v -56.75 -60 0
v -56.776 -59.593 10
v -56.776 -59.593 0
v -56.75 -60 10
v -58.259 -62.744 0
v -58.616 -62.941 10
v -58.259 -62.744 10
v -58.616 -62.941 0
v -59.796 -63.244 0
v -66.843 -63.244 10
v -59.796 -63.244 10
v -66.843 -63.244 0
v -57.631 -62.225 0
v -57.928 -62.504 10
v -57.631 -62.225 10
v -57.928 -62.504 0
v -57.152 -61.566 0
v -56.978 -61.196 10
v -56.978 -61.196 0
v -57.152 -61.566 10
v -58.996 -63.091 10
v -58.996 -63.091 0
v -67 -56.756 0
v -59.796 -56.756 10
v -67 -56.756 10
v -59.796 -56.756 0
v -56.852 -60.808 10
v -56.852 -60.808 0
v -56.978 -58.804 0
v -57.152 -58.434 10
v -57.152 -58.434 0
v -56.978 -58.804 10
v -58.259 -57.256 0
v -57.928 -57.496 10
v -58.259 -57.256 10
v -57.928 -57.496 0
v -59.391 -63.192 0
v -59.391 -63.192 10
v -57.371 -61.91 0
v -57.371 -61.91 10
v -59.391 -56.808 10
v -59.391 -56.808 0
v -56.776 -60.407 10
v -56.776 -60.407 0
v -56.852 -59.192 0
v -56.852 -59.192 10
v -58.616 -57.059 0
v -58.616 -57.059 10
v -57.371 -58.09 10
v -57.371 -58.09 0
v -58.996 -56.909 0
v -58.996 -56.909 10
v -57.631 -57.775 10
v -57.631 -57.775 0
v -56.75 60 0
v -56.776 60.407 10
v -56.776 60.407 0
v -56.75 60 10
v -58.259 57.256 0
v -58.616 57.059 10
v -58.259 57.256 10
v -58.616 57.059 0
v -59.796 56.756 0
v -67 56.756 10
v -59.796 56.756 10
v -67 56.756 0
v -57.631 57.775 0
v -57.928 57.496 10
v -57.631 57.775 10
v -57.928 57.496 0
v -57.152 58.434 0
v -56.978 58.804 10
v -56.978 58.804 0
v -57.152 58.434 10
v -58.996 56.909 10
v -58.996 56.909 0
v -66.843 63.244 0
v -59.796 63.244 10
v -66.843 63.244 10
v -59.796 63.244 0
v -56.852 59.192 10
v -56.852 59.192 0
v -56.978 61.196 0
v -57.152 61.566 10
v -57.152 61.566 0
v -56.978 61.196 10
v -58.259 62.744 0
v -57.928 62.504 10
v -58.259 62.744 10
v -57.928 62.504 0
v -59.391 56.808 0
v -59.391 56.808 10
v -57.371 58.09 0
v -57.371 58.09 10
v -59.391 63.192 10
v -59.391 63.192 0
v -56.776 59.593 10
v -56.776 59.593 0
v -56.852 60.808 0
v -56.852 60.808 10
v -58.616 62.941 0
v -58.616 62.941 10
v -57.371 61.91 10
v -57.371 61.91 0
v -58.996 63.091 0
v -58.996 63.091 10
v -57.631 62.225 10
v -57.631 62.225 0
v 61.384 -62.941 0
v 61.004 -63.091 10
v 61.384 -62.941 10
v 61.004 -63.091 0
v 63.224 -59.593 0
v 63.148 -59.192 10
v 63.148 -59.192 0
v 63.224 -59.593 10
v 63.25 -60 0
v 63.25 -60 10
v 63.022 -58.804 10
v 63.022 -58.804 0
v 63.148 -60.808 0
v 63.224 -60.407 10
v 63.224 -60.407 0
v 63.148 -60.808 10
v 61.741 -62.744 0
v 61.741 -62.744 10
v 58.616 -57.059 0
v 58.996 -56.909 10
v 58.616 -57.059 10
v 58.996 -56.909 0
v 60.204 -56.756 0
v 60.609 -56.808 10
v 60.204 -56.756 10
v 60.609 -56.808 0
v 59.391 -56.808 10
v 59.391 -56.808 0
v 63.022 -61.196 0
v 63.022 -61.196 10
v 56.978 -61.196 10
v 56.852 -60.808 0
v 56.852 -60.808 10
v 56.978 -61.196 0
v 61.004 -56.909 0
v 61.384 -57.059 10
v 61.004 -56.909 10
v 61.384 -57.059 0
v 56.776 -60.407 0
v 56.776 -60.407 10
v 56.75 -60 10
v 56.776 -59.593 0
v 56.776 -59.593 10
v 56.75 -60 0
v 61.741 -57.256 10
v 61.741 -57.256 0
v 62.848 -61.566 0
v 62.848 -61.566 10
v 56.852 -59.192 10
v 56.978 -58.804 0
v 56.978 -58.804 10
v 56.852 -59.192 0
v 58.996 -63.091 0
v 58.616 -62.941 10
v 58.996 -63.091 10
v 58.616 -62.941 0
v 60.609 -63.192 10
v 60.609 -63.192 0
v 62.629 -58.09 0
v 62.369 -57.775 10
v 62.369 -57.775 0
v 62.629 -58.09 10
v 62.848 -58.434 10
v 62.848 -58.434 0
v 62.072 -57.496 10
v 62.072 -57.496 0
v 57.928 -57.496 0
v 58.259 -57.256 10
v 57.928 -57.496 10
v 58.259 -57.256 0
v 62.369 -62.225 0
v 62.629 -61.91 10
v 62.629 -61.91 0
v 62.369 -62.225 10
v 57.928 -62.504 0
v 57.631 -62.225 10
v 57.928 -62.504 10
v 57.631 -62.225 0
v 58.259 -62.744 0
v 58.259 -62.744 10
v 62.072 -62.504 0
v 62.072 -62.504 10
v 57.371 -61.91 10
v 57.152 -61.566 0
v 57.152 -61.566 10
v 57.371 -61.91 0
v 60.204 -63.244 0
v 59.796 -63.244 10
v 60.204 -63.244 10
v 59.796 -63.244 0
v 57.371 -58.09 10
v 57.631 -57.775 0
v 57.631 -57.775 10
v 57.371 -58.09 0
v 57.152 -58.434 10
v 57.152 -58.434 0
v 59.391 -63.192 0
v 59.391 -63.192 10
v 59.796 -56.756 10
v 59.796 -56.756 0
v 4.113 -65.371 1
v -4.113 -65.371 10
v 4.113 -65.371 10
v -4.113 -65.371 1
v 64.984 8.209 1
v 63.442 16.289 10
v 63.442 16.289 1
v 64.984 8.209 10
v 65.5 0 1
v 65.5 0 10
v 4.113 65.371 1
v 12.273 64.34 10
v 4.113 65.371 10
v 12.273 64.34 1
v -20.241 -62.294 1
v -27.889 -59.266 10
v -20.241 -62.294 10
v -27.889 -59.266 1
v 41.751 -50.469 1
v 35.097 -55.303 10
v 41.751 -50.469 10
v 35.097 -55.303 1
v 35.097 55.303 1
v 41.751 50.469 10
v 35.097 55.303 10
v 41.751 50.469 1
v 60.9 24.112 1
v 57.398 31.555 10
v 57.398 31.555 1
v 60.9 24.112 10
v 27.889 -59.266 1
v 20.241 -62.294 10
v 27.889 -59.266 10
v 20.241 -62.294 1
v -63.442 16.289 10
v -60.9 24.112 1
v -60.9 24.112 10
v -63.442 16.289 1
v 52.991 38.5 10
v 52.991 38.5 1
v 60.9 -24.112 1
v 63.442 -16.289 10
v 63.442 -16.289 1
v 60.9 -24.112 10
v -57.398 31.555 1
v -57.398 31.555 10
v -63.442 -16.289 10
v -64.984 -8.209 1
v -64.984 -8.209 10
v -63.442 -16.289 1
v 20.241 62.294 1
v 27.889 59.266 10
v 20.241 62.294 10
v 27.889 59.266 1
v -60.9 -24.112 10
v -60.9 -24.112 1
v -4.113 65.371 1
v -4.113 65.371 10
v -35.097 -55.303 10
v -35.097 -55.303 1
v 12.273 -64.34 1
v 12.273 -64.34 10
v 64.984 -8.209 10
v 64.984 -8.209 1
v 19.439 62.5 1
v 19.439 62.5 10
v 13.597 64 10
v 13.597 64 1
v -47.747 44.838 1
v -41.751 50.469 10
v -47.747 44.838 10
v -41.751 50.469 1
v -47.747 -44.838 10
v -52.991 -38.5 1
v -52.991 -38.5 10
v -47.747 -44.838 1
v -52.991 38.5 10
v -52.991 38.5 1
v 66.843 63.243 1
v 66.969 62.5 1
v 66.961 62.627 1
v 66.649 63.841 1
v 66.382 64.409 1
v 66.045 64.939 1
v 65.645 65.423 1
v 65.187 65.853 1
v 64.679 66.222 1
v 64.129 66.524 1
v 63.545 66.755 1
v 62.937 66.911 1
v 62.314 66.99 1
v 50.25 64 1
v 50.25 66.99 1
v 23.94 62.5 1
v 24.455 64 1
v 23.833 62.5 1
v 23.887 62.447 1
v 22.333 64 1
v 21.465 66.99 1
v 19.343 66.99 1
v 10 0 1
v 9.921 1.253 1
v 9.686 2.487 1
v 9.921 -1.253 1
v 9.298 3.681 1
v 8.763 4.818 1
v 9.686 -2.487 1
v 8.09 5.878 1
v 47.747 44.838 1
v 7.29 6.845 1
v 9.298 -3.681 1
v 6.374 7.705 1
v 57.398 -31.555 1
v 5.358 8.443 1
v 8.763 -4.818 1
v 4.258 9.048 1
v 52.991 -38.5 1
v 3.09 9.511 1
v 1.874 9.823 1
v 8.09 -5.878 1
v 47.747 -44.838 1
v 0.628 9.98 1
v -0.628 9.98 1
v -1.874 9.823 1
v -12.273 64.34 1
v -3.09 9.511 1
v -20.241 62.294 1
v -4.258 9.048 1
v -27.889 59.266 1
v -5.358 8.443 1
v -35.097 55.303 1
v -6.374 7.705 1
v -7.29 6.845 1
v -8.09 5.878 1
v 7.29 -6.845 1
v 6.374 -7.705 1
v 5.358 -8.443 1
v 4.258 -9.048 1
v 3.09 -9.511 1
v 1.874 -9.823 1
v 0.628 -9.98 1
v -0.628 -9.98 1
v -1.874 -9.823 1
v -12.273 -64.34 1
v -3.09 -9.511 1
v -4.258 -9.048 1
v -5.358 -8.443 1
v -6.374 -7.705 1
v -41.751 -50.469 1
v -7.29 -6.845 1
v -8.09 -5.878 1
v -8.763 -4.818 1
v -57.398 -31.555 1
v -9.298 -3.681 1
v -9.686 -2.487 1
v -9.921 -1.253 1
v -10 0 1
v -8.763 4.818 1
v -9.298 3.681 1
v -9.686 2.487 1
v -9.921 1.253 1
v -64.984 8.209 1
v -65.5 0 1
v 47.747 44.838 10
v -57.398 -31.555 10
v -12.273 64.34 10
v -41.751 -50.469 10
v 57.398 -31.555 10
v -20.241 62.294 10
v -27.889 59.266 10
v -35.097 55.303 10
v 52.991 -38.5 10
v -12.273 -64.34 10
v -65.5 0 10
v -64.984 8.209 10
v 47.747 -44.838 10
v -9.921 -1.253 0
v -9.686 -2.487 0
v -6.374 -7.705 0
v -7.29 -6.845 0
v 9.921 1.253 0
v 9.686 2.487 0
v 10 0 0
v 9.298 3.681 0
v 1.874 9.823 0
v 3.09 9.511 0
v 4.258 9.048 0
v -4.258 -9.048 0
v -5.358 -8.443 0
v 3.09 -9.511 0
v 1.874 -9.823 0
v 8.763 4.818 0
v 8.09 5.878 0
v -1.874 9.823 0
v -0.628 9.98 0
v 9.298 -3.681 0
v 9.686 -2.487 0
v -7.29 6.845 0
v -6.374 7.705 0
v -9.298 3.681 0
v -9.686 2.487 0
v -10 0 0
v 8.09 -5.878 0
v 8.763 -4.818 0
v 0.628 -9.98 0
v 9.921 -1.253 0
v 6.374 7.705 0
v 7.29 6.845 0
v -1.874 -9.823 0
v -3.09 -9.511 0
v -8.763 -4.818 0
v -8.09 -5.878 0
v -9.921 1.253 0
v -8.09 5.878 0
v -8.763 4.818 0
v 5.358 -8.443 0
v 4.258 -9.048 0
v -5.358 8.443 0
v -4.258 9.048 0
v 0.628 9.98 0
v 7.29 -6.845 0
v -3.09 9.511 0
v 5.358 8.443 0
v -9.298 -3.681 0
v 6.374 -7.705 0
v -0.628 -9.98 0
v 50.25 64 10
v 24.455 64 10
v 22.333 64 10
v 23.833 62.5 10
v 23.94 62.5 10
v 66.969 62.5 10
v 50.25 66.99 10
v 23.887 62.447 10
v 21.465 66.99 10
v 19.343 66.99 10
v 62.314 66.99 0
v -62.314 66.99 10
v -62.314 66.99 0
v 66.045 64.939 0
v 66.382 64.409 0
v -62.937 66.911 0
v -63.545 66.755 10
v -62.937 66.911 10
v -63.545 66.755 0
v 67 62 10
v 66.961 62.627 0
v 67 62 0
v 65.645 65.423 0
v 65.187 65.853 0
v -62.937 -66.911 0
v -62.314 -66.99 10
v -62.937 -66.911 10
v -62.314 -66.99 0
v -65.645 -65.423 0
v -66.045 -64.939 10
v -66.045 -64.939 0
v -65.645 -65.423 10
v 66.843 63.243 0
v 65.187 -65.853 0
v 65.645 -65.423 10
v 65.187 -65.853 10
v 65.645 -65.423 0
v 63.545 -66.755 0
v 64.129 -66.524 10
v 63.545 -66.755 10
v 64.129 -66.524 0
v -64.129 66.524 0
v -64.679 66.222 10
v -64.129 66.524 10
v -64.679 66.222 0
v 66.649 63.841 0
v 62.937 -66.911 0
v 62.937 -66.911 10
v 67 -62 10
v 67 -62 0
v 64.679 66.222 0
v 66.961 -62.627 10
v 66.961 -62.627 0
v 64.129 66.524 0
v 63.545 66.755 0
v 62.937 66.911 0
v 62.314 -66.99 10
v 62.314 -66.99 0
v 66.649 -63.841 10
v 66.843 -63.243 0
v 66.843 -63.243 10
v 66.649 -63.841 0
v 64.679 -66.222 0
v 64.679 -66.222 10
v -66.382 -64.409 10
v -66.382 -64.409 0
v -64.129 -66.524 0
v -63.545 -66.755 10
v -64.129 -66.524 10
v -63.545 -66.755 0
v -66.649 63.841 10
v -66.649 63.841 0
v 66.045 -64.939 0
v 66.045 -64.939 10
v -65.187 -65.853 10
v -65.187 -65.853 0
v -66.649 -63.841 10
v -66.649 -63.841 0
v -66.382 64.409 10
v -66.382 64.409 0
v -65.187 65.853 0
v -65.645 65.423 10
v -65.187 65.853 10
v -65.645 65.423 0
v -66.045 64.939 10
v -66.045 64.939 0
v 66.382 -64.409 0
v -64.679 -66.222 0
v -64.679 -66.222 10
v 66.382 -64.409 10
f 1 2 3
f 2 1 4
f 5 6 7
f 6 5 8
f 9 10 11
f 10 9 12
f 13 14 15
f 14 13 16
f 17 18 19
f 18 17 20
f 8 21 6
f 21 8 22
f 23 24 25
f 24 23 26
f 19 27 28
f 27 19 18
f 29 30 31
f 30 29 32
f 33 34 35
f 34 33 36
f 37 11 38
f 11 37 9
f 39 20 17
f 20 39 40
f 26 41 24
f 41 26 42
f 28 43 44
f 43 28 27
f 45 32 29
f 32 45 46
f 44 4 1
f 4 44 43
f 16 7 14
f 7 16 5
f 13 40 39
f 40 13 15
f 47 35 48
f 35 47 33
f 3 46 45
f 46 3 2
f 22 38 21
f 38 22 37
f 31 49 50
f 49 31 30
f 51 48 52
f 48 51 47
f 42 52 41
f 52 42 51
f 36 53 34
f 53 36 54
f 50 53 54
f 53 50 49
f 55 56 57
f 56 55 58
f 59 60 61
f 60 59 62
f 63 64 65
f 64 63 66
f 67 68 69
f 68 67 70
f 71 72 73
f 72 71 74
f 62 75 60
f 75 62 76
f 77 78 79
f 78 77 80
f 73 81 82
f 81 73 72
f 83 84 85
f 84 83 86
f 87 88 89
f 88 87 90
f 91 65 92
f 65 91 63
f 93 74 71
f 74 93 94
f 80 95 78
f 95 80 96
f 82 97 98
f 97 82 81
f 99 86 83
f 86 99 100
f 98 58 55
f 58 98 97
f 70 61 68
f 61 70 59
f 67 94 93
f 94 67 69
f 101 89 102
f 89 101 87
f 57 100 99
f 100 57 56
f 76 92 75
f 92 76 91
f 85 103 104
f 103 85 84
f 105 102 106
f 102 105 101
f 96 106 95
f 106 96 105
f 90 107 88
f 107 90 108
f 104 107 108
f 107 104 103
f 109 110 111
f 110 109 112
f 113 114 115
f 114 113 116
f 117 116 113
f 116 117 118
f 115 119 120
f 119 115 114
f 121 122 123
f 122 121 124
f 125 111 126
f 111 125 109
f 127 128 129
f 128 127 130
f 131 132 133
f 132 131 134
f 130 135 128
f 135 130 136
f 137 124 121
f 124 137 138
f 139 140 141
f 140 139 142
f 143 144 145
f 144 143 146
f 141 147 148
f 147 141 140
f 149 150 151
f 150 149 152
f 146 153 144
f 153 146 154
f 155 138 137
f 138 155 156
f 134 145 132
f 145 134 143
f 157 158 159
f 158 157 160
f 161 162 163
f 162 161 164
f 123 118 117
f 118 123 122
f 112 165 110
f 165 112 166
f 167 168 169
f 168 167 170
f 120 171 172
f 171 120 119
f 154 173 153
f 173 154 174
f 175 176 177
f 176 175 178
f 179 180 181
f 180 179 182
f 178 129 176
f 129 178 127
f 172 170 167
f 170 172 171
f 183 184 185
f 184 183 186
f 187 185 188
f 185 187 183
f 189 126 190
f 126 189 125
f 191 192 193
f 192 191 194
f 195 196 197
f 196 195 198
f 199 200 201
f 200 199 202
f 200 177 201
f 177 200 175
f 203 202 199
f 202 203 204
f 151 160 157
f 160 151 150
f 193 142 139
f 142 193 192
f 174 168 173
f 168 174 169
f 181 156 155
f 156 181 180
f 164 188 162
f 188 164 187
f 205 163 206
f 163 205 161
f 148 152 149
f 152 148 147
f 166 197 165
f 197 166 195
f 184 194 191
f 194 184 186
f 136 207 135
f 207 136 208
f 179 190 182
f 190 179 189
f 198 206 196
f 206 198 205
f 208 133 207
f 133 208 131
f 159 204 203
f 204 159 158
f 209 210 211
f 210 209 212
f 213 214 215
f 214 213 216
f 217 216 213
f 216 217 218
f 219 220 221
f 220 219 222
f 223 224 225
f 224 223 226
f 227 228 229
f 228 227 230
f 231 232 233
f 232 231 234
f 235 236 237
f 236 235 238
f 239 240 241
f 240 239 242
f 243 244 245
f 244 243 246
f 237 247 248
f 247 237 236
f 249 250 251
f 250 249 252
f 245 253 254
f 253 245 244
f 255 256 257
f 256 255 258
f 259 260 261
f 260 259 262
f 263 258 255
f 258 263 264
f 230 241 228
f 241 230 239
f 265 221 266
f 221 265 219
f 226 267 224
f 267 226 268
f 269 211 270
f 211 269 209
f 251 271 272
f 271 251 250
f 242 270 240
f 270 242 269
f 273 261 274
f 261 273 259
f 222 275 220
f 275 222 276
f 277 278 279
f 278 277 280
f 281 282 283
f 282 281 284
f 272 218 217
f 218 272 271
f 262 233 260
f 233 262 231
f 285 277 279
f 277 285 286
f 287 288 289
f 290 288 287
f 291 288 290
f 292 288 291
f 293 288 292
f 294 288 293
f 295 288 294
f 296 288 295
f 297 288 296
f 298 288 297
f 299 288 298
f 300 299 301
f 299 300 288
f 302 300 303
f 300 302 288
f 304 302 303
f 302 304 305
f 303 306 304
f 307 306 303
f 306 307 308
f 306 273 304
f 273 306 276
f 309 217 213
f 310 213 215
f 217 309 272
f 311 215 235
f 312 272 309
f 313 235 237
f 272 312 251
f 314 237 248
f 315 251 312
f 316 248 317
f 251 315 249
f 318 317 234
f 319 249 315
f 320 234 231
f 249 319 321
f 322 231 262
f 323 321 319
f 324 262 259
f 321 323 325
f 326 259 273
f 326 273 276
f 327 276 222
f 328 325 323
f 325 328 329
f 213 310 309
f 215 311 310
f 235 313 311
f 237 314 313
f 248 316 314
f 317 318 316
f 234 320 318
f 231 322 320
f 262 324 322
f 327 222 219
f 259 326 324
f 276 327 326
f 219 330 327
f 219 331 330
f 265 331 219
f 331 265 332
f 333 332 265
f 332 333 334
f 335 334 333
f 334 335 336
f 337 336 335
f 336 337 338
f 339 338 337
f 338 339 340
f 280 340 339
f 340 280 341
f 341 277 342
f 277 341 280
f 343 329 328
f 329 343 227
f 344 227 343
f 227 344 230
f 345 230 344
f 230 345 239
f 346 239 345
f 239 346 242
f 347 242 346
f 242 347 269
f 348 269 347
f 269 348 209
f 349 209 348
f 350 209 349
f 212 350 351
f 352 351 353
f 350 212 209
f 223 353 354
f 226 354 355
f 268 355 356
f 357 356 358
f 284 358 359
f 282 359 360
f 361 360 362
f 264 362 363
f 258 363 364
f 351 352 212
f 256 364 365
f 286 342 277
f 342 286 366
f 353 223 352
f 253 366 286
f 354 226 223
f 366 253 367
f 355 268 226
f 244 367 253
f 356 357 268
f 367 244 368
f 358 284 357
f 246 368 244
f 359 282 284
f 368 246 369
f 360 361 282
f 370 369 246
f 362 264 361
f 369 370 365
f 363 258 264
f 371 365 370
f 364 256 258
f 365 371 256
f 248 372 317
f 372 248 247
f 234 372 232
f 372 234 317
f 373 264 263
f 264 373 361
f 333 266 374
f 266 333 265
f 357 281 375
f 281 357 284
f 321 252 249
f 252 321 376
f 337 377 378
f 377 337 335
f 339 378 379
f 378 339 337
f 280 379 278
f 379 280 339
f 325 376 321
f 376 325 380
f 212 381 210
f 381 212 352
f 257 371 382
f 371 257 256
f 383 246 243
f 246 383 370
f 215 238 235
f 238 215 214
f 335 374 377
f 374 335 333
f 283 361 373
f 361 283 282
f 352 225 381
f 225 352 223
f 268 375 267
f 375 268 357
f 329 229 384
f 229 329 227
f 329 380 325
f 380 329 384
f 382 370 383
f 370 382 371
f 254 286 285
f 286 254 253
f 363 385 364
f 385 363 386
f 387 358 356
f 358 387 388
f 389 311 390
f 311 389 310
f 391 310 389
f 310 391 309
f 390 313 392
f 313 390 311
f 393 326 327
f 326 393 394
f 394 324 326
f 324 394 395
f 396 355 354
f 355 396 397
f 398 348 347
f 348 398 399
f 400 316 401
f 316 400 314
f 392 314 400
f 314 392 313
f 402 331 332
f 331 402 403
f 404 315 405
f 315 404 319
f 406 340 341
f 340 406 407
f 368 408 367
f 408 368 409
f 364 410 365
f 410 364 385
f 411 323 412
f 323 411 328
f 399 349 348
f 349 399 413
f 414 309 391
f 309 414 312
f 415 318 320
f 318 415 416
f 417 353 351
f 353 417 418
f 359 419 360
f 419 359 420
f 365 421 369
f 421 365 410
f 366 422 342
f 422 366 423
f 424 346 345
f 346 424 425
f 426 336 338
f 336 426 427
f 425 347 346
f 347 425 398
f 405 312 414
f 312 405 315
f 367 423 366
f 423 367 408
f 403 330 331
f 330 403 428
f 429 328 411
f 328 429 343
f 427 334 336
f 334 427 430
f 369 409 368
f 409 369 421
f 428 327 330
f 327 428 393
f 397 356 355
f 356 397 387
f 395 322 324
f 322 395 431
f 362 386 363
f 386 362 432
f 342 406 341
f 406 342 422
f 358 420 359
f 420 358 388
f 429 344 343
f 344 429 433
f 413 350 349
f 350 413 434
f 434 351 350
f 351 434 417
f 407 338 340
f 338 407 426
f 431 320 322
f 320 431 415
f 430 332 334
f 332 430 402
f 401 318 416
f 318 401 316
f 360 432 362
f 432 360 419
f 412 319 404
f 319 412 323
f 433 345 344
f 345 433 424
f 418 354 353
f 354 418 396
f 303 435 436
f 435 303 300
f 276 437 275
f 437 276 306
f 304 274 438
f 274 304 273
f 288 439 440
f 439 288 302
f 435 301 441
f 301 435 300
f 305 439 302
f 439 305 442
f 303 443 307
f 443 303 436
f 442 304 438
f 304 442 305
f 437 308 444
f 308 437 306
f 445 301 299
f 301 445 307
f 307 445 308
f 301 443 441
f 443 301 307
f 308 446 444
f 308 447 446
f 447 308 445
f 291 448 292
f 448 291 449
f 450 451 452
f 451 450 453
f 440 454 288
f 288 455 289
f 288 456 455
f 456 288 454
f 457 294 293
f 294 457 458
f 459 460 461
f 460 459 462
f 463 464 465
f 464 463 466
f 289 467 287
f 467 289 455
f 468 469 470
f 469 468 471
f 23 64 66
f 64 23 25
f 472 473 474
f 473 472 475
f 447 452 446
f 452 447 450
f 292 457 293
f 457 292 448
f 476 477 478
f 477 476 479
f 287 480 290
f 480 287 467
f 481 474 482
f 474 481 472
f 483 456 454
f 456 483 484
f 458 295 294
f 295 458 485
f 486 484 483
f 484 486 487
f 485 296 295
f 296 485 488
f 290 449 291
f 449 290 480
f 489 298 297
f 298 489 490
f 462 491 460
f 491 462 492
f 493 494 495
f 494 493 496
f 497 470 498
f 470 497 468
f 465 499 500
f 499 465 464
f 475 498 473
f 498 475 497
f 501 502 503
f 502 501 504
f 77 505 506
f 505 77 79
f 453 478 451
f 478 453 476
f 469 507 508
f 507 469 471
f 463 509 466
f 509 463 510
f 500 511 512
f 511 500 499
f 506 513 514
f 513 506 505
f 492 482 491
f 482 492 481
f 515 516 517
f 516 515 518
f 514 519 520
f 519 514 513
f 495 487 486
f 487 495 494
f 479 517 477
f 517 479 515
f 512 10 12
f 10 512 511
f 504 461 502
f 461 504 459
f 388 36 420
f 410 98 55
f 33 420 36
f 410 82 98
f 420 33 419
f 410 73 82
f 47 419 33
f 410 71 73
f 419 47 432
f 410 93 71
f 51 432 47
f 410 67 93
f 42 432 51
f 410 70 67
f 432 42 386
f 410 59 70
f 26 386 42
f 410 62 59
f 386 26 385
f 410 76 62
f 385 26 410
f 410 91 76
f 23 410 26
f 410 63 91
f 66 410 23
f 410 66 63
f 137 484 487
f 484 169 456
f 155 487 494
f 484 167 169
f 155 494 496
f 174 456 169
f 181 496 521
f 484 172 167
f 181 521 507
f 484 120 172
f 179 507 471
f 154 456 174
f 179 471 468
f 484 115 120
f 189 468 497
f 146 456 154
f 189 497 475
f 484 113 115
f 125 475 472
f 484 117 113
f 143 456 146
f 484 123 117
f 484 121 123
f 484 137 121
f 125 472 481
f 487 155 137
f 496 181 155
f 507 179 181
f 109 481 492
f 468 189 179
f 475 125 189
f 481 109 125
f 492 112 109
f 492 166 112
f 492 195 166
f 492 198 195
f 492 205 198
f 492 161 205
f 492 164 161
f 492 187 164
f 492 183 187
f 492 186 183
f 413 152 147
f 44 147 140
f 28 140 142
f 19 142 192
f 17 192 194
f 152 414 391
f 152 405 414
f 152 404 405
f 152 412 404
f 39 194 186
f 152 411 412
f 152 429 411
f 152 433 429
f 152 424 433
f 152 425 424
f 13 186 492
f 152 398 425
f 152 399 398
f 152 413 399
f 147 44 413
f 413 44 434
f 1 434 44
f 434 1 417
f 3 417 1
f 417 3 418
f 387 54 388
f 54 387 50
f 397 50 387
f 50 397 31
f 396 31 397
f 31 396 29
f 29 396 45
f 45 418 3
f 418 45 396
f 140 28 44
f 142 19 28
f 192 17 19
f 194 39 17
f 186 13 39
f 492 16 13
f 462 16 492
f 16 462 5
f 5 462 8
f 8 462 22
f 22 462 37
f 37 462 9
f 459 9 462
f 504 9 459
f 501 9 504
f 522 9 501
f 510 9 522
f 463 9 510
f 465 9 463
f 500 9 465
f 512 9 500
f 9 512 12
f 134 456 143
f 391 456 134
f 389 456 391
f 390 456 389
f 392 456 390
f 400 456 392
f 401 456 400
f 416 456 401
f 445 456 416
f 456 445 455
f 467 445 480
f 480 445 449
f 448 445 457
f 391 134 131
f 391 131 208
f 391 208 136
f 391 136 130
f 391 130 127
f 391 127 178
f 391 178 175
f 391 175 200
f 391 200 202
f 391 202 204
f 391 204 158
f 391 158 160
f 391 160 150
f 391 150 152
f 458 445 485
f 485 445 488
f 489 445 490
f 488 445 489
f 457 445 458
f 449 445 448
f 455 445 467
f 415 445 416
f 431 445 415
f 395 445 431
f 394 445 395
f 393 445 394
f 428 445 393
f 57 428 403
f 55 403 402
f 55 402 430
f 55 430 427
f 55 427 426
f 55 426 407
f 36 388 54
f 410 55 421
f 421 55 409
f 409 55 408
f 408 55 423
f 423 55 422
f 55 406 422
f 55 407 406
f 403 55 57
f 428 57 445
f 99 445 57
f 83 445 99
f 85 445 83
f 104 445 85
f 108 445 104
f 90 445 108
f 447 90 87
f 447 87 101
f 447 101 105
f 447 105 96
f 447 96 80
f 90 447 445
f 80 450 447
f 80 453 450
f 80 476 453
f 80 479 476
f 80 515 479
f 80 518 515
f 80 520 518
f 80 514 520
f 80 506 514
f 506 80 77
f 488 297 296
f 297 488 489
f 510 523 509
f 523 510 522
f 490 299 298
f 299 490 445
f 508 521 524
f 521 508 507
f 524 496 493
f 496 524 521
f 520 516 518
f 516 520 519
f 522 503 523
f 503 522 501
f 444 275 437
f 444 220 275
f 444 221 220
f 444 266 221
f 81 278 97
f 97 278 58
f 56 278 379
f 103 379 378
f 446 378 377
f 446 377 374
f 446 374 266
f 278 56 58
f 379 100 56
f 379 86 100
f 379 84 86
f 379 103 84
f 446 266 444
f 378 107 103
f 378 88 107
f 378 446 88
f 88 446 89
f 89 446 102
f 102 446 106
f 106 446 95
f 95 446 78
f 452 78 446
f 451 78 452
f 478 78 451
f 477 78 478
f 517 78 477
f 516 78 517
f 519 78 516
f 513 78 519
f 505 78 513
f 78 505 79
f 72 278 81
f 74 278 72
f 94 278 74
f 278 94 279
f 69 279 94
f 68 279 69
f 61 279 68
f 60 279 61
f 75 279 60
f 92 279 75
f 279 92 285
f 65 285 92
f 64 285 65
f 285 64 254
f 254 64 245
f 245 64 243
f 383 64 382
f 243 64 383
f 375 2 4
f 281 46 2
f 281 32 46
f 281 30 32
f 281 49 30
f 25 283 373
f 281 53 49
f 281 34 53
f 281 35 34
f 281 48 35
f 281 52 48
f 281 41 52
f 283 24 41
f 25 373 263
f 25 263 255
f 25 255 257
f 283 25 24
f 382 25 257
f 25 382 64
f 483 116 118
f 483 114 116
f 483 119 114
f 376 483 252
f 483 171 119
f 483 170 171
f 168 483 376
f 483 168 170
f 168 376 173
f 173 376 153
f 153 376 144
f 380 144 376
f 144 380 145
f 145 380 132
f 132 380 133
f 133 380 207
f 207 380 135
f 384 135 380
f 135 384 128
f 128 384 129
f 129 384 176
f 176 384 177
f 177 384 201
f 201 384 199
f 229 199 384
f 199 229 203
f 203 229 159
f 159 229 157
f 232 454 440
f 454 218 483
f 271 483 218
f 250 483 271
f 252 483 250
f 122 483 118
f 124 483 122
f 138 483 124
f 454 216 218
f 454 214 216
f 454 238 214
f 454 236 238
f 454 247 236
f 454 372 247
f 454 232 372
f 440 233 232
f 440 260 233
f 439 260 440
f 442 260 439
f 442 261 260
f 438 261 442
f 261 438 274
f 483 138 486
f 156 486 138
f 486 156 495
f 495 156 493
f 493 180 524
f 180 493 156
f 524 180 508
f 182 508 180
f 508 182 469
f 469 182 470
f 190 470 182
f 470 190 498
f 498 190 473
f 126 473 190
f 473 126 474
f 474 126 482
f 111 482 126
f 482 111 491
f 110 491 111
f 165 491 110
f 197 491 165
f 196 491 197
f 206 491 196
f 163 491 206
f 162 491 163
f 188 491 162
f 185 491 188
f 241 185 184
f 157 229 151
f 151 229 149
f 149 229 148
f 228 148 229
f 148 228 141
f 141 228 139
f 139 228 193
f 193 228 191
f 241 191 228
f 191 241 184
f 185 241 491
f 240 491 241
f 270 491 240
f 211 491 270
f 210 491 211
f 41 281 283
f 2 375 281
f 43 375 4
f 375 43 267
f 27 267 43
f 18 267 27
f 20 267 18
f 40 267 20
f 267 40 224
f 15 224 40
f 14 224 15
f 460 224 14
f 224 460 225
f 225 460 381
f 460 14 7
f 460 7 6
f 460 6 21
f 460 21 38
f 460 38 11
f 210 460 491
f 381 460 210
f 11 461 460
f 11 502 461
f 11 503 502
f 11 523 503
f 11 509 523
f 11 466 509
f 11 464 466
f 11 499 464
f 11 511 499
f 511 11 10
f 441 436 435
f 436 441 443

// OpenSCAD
$fn = 50;


difference() {
	union() {
		translate(v = [0, 0, 0]) {
			rotate(a = [0, 0, 0]) {
				hull() {
					translate(v = [-62.0000000000, 62.0000000000, 0]) {
						rotate(a = [0, 0, 0]) {
							translate(v = [0, 0, 0]) {
								rotate(a = [0, 0, 0]) {
									cylinder(h = 10, r = 5);
								}
							}
						}
					}
					translate(v = [62.0000000000, 62.0000000000, 0]) {
						rotate(a = [0, 0, 0]) {
							translate(v = [0, 0, 0]) {
								rotate(a = [0, 0, 0]) {
									cylinder(h = 10, r = 5);
								}
							}
						}
					}
					translate(v = [-62.0000000000, -62.0000000000, 0]) {
						rotate(a = [0, 0, 0]) {
							translate(v = [0, 0, 0]) {
								rotate(a = [0, 0, 0]) {
									cylinder(h = 10, r = 5);
								}
							}
						}
					}
					translate(v = [62.0000000000, -62.0000000000, 0]) {
						rotate(a = [0, 0, 0]) {
							translate(v = [0, 0, 0]) {
								rotate(a = [0, 0, 0]) {
									cylinder(h = 10, r = 5);
								}
							}
						}
					}
				}
			}
		}
	}
	union() {
		translate(v = [-67.5000000000, -60.0000000000, -125]) {
			rotate(a = [0, 0, 0]) {
				hull() {
					translate(v = [7.5000000000, 0, 0]) {
						rotate(a = [0, 0, 0]) {
							translate(v = [0, 0, 0]) {
								rotate(a = [0, 0, 0]) {
									cylinder(h = 250, r = 3.2500000000);
								}
							}
						}
					}
					translate(v = [-7.5000000000, 0, 0]) {
						rotate(a = [0, 0, 0]) {
							translate(v = [0, 0, 0]) {
								rotate(a = [0, 0, 0]) {
									cylinder(h = 250, r = 3.2500000000);
								}
							}
						}
					}
				}
			}
		}
		translate(v = [-67.5000000000, 60.0000000000, -125]) {
			rotate(a = [0, 0, 0]) {
				hull() {
					translate(v = [7.5000000000, 0, 0]) {
						rotate(a = [0, 0, 0]) {
							translate(v = [0, 0, 0]) {
								rotate(a = [0, 0, 0]) {
									cylinder(h = 250, r = 3.2500000000);
								}
							}
						}
					}
					translate(v = [-7.5000000000, 0, 0]) {
						rotate(a = [0, 0, 0]) {
							translate(v = [0, 0, 0]) {
								rotate(a = [0, 0, 0]) {
									cylinder(h = 250, r = 3.2500000000);
								}
							}
						}
					}
				}
			}
		}
		translate(v = [60.0000000000, -60.0000000000, -125.0000000000]) {
			rotate(a = [0, 0, 0]) {
				cylinder(h = 250, r = 3.2500000000);
			}
		}
		translate(v = [0, 0, 1.0000000000]) {
			rotate(a = [0, 0, 0]) {
				cylinder(h = 12, r = 65.5000000000);
			}
		}
		translate(v = [0, 0, -5.0000000000]) {
			rotate(a = [0, 0, 0]) {
				cylinder(h = 10, r = 10.0000000000);
			}
		}
		translate(v = [0.0000000000, 62.5000000000, 1]) {
			rotate(a = [0, 0, 0]) {
				cube(size = [67.0000000000, 1.5000000000, 12]);
			}
		}
		translate(v = [50.2500000000, 62.5000000000, 1]) {
			rotate(a = [0, 0, 0]) {
				cube(size = [16.7500000000, 4.5000000000, 12]);
			}
		}
		translate(v = [18.5833333333, 67.7500000000, 1]) {
			rotate(a = [0, 0, -45]) {
				cube(size = [7.5000000000, 1.5000000000, 12]);
			}
		}
	}
}
